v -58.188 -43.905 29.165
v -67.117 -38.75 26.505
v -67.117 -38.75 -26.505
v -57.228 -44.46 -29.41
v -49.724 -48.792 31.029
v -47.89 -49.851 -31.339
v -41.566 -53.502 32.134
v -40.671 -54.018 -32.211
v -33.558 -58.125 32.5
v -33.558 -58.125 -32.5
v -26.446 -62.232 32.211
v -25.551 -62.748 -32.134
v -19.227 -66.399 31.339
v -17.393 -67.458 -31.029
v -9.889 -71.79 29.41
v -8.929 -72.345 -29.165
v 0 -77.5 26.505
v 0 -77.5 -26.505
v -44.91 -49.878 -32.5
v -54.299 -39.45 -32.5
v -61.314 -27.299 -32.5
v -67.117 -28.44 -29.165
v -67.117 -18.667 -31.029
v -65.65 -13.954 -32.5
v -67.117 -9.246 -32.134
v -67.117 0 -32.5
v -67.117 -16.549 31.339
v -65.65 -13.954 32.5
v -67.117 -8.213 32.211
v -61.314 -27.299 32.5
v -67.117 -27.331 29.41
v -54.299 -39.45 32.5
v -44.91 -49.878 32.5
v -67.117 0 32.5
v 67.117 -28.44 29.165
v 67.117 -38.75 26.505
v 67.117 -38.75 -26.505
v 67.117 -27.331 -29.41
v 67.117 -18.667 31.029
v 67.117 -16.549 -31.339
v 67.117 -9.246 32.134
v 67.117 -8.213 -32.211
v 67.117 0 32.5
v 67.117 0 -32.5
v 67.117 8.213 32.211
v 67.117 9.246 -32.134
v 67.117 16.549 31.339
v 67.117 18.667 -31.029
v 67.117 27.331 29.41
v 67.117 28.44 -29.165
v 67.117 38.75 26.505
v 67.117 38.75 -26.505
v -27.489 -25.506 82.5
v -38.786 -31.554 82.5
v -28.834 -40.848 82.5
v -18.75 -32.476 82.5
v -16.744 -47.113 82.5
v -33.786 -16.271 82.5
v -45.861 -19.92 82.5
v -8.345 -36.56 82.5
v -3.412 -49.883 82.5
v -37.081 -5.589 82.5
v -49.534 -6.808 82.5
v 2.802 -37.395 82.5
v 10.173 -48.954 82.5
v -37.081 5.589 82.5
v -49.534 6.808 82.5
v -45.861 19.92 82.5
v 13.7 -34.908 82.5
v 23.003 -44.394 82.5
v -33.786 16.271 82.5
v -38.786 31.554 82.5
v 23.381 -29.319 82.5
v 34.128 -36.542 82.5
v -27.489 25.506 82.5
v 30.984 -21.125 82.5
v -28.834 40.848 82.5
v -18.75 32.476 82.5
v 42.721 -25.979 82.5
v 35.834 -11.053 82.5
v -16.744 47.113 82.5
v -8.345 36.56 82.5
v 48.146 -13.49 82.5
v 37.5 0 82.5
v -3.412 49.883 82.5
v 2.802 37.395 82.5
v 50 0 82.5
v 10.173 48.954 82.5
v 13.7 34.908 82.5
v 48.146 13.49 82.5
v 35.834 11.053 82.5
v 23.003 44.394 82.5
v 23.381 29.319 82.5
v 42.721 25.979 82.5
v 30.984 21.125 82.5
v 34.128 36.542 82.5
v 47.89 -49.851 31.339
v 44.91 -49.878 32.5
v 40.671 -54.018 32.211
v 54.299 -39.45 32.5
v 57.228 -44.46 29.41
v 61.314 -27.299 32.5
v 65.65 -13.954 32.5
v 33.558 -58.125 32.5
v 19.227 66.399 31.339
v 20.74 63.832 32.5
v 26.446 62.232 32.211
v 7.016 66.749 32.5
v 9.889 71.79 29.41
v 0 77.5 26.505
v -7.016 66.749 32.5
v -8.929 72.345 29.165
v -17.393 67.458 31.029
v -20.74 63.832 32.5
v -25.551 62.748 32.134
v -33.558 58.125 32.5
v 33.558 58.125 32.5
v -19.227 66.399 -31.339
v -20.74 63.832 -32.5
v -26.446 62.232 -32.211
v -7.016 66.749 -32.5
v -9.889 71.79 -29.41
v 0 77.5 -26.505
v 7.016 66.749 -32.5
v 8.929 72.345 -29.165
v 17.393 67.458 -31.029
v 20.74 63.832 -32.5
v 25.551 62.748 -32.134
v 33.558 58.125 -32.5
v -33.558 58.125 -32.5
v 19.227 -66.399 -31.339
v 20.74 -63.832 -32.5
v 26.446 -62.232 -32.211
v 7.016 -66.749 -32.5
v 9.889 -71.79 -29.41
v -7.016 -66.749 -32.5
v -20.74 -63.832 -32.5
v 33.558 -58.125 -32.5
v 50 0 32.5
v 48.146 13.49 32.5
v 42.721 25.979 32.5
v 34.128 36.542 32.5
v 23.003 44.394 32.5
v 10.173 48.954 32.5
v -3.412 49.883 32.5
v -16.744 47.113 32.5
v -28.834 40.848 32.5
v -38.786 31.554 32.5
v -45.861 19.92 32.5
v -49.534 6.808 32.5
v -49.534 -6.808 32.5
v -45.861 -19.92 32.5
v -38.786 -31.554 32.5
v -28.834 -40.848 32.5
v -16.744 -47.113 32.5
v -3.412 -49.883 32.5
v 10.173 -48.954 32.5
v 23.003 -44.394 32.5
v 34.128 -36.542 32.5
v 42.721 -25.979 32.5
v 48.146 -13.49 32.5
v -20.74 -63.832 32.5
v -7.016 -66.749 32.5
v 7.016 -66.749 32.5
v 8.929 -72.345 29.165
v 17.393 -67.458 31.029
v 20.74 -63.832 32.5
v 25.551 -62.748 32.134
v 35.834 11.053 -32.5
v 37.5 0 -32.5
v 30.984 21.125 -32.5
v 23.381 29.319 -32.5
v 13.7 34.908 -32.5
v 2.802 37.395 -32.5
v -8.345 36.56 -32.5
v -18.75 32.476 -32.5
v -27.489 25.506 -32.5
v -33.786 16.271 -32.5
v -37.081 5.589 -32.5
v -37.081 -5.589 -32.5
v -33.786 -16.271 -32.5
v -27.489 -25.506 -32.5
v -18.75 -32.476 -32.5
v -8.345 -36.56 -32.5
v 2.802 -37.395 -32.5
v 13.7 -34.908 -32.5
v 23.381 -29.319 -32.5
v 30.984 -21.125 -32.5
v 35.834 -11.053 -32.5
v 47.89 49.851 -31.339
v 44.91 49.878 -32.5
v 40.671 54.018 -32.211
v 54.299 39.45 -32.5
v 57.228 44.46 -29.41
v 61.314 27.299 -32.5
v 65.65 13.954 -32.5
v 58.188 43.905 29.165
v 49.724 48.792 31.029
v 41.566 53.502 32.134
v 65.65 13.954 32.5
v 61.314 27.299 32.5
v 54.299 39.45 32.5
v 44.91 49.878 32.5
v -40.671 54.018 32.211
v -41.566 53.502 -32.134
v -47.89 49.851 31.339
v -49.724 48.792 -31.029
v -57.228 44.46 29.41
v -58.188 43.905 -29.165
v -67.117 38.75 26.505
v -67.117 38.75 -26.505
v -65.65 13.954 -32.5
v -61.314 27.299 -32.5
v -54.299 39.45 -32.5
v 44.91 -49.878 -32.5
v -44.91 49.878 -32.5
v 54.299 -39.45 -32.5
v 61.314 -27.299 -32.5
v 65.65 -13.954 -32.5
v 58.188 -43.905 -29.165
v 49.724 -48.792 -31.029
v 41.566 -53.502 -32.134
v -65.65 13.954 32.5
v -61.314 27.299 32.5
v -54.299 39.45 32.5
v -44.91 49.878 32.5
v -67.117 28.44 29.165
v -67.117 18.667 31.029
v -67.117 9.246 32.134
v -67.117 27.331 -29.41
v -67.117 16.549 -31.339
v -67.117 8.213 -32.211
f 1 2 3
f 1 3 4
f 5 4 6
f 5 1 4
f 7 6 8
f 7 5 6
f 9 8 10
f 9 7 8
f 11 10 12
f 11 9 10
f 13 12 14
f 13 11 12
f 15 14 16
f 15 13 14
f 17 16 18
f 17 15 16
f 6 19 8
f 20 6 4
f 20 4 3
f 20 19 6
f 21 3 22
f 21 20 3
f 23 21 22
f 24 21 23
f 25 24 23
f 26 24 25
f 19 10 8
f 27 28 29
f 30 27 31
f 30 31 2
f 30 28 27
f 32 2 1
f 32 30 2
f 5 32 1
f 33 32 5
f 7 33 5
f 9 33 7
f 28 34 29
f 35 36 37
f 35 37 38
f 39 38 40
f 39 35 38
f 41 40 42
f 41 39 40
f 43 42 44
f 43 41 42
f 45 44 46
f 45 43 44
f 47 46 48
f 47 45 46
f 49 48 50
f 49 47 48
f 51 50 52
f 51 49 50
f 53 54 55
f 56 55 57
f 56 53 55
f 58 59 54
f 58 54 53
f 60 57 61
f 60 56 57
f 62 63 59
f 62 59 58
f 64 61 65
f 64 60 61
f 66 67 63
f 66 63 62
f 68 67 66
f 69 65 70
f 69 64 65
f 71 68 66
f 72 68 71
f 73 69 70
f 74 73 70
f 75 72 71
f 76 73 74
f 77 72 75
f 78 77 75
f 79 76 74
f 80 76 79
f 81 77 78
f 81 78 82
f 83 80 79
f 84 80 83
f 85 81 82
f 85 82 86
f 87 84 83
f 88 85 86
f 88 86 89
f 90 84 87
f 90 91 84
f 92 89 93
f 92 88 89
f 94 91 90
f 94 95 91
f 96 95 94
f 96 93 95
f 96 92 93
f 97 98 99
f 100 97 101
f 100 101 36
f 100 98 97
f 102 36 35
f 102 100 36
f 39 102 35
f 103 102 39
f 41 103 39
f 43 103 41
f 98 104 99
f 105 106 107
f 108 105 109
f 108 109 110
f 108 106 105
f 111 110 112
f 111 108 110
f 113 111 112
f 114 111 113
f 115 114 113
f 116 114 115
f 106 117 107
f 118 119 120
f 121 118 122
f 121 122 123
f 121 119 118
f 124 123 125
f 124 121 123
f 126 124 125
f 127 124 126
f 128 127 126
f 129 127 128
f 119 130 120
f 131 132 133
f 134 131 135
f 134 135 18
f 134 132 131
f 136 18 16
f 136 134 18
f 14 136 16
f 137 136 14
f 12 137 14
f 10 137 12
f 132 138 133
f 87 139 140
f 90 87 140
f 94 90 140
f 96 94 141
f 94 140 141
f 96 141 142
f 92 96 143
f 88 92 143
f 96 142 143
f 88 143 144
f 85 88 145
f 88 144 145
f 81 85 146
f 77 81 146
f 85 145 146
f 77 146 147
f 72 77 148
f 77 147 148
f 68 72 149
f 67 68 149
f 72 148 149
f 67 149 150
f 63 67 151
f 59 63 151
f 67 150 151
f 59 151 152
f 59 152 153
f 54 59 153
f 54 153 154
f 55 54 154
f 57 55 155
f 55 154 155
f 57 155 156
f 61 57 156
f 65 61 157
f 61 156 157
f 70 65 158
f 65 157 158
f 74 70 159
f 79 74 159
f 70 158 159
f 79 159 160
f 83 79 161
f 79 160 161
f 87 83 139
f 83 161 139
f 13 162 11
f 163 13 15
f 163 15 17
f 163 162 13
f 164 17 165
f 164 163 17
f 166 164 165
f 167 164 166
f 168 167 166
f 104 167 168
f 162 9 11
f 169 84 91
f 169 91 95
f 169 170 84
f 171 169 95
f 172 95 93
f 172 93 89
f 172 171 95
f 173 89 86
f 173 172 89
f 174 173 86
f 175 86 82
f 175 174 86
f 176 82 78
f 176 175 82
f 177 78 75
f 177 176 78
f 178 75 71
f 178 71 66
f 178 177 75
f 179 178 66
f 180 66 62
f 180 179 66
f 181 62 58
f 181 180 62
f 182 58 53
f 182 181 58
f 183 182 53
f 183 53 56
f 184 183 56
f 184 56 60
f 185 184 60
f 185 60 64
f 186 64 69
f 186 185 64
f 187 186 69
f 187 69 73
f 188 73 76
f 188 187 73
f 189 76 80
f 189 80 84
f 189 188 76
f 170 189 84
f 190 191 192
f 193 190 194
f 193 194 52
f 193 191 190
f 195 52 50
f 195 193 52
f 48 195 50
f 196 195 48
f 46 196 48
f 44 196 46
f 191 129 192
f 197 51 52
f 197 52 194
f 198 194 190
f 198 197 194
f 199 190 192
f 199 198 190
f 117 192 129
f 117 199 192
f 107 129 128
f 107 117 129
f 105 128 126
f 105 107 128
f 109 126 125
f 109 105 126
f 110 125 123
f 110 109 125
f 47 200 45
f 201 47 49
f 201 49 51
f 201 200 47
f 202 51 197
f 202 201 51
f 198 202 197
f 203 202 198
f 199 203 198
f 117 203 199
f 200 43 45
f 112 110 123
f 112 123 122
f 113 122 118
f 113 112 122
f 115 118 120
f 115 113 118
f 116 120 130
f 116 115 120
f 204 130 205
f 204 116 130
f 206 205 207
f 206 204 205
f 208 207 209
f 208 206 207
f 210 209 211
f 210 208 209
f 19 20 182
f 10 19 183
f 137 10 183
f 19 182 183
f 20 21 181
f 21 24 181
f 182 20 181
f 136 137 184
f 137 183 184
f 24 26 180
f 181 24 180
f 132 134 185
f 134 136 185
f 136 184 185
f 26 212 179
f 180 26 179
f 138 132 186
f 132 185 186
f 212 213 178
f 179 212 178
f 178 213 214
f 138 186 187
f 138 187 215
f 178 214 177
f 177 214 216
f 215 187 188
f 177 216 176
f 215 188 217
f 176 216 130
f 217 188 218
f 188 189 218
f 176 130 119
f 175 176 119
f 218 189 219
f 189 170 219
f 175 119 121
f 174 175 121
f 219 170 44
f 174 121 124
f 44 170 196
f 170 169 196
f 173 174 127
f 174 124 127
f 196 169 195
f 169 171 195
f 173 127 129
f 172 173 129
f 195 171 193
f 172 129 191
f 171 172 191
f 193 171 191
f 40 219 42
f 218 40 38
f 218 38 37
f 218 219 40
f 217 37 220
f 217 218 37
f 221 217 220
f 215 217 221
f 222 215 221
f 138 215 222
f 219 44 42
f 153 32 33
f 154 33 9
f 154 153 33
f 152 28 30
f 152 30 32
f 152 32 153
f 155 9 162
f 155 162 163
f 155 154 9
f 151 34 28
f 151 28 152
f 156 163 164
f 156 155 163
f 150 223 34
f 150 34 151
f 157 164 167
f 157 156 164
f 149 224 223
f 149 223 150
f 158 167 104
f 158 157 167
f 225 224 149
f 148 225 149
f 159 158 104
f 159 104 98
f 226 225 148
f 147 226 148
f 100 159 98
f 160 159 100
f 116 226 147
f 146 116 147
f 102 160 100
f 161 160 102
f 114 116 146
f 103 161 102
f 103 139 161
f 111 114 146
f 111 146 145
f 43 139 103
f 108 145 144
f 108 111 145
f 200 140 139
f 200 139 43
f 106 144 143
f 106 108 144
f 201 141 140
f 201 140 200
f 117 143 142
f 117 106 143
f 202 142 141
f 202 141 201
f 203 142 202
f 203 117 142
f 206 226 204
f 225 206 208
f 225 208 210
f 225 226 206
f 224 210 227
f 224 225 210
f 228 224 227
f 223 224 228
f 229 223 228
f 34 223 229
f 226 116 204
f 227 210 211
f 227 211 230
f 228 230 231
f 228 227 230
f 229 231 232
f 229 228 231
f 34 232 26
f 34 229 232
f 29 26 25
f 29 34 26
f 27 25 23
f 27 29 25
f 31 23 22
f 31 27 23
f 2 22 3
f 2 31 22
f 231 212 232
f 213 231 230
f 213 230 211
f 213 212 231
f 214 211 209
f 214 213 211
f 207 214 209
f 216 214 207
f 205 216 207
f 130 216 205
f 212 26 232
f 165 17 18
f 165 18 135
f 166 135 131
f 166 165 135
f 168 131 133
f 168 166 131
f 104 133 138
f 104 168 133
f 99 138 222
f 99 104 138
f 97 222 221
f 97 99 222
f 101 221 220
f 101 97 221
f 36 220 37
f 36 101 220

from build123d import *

# Parameters (mm, degrees)
SKETCH1_R           = 37.5
BOSS_EXTRUDE1_DEPTH = 32.5
SKETCH2_OUTSIDE_W   = 603.232
SKETCH2_OUTSIDE_H   = 623.998
SKETCH2_OUTSIDE_R   = 67.116968793
CUT_EXTRUDE1_DEPTH  = 122.391669813
CUT_EXTRUDE1_DRAFT  = -60
SKETCH3_OUTSIDE_W   = 603.232
SKETCH3_OUTSIDE_H   = 623.998
SKETCH3_OUTSIDE_R   = 67.116968793
CUT_EXTRUDE2_DEPTH  = 122.391669813
CUT_EXTRUDE2_DRAFT  = -60
SKETCH4_R           = 50
SKETCH4_R_2         = 37.5
BOSS_EXTRUDE2_DEPTH = 50


with BuildPart() as part:
    # Sketch1 → Boss-Extrude1 (new, symmetric)
    with BuildSketch(Plane.XY):
        Polygon((0, 77.5), (-67.116968793, 38.75), (-67.116968793, -38.75), (0, -77.5), (67.116968793, -38.75), (67.116968793, 38.75), align=None)
        Circle(SKETCH1_R, mode=Mode.SUBTRACT)
    extrude(amount=BOSS_EXTRUDE1_DEPTH, both=True)


with BuildPart() as cut_extrude1_tool:
    # Sketch2 outside → Cut-Extrude1 (with draft: the straight prism first)
    with BuildSketch(Plane.XY.offset(32.5)):
        Rectangle(SKETCH2_OUTSIDE_W, SKETCH2_OUTSIDE_H)
        Circle(SKETCH2_OUTSIDE_R, mode=Mode.SUBTRACT)
    extrude(amount=-CUT_EXTRUDE1_DEPTH)
    # Cut-Extrude1: the draft: its side faces are tilted about the plane it starts from
    cut_extrude1_sides = [cut_extrude1_tool.faces().sort_by_distance(p)[0] for p in [
        (0, -311.999, -28.695834907),
        (301.616, 0, -28.695834907),
        (0, 311.999, -28.695834907),
        (-301.616, 0, -28.695834907),
        (-67.116968793, 0, -28.695834907),
    ]]
    draft(cut_extrude1_sides, Plane.XY.offset(32.5), CUT_EXTRUDE1_DRAFT)


with BuildPart() as part_1:
    add(part.part)

    # Cut-Extrude1: cut by cut_extrude1_tool
    add(cut_extrude1_tool.part, mode=Mode.SUBTRACT)


with BuildPart() as cut_extrude2_tool:
    # Sketch3 outside → Cut-Extrude2 (with draft: the straight prism first)
    with BuildSketch(Plane(origin=(0, 0, -32.5), x_dir=(-1, 0, 0), z_dir=(0, 0, -1))):
        Rectangle(SKETCH3_OUTSIDE_W, SKETCH3_OUTSIDE_H)
        Circle(SKETCH3_OUTSIDE_R, mode=Mode.SUBTRACT)
    extrude(amount=-CUT_EXTRUDE2_DEPTH)
    # Cut-Extrude2: the draft: its side faces are tilted about the plane it starts from
    cut_extrude2_sides = [cut_extrude2_tool.faces().sort_by_distance(p)[0] for p in [
        (0, -311.999, 28.695834907),
        (-301.616, 0, 28.695834907),
        (0, 311.999, 28.695834907),
        (301.616, 0, 28.695834907),
        (67.116968793, 0, 28.695834907),
    ]]
    draft(cut_extrude2_sides, Plane(origin=(0, 0, -32.5), x_dir=(-1, 0, 0), z_dir=(0, 0, -1)), CUT_EXTRUDE2_DRAFT)


with BuildPart() as part_2:
    add(part_1.part)

    # Cut-Extrude2: cut by cut_extrude2_tool
    add(cut_extrude2_tool.part, mode=Mode.SUBTRACT)

    # Sketch4 → Boss-Extrude2 (add)
    with BuildSketch(Plane.XY.offset(32.5)):
        Circle(SKETCH4_R)
        Circle(SKETCH4_R_2, mode=Mode.SUBTRACT)
    extrude(amount=BOSS_EXTRUDE2_DEPTH)


solid = part_2.part
